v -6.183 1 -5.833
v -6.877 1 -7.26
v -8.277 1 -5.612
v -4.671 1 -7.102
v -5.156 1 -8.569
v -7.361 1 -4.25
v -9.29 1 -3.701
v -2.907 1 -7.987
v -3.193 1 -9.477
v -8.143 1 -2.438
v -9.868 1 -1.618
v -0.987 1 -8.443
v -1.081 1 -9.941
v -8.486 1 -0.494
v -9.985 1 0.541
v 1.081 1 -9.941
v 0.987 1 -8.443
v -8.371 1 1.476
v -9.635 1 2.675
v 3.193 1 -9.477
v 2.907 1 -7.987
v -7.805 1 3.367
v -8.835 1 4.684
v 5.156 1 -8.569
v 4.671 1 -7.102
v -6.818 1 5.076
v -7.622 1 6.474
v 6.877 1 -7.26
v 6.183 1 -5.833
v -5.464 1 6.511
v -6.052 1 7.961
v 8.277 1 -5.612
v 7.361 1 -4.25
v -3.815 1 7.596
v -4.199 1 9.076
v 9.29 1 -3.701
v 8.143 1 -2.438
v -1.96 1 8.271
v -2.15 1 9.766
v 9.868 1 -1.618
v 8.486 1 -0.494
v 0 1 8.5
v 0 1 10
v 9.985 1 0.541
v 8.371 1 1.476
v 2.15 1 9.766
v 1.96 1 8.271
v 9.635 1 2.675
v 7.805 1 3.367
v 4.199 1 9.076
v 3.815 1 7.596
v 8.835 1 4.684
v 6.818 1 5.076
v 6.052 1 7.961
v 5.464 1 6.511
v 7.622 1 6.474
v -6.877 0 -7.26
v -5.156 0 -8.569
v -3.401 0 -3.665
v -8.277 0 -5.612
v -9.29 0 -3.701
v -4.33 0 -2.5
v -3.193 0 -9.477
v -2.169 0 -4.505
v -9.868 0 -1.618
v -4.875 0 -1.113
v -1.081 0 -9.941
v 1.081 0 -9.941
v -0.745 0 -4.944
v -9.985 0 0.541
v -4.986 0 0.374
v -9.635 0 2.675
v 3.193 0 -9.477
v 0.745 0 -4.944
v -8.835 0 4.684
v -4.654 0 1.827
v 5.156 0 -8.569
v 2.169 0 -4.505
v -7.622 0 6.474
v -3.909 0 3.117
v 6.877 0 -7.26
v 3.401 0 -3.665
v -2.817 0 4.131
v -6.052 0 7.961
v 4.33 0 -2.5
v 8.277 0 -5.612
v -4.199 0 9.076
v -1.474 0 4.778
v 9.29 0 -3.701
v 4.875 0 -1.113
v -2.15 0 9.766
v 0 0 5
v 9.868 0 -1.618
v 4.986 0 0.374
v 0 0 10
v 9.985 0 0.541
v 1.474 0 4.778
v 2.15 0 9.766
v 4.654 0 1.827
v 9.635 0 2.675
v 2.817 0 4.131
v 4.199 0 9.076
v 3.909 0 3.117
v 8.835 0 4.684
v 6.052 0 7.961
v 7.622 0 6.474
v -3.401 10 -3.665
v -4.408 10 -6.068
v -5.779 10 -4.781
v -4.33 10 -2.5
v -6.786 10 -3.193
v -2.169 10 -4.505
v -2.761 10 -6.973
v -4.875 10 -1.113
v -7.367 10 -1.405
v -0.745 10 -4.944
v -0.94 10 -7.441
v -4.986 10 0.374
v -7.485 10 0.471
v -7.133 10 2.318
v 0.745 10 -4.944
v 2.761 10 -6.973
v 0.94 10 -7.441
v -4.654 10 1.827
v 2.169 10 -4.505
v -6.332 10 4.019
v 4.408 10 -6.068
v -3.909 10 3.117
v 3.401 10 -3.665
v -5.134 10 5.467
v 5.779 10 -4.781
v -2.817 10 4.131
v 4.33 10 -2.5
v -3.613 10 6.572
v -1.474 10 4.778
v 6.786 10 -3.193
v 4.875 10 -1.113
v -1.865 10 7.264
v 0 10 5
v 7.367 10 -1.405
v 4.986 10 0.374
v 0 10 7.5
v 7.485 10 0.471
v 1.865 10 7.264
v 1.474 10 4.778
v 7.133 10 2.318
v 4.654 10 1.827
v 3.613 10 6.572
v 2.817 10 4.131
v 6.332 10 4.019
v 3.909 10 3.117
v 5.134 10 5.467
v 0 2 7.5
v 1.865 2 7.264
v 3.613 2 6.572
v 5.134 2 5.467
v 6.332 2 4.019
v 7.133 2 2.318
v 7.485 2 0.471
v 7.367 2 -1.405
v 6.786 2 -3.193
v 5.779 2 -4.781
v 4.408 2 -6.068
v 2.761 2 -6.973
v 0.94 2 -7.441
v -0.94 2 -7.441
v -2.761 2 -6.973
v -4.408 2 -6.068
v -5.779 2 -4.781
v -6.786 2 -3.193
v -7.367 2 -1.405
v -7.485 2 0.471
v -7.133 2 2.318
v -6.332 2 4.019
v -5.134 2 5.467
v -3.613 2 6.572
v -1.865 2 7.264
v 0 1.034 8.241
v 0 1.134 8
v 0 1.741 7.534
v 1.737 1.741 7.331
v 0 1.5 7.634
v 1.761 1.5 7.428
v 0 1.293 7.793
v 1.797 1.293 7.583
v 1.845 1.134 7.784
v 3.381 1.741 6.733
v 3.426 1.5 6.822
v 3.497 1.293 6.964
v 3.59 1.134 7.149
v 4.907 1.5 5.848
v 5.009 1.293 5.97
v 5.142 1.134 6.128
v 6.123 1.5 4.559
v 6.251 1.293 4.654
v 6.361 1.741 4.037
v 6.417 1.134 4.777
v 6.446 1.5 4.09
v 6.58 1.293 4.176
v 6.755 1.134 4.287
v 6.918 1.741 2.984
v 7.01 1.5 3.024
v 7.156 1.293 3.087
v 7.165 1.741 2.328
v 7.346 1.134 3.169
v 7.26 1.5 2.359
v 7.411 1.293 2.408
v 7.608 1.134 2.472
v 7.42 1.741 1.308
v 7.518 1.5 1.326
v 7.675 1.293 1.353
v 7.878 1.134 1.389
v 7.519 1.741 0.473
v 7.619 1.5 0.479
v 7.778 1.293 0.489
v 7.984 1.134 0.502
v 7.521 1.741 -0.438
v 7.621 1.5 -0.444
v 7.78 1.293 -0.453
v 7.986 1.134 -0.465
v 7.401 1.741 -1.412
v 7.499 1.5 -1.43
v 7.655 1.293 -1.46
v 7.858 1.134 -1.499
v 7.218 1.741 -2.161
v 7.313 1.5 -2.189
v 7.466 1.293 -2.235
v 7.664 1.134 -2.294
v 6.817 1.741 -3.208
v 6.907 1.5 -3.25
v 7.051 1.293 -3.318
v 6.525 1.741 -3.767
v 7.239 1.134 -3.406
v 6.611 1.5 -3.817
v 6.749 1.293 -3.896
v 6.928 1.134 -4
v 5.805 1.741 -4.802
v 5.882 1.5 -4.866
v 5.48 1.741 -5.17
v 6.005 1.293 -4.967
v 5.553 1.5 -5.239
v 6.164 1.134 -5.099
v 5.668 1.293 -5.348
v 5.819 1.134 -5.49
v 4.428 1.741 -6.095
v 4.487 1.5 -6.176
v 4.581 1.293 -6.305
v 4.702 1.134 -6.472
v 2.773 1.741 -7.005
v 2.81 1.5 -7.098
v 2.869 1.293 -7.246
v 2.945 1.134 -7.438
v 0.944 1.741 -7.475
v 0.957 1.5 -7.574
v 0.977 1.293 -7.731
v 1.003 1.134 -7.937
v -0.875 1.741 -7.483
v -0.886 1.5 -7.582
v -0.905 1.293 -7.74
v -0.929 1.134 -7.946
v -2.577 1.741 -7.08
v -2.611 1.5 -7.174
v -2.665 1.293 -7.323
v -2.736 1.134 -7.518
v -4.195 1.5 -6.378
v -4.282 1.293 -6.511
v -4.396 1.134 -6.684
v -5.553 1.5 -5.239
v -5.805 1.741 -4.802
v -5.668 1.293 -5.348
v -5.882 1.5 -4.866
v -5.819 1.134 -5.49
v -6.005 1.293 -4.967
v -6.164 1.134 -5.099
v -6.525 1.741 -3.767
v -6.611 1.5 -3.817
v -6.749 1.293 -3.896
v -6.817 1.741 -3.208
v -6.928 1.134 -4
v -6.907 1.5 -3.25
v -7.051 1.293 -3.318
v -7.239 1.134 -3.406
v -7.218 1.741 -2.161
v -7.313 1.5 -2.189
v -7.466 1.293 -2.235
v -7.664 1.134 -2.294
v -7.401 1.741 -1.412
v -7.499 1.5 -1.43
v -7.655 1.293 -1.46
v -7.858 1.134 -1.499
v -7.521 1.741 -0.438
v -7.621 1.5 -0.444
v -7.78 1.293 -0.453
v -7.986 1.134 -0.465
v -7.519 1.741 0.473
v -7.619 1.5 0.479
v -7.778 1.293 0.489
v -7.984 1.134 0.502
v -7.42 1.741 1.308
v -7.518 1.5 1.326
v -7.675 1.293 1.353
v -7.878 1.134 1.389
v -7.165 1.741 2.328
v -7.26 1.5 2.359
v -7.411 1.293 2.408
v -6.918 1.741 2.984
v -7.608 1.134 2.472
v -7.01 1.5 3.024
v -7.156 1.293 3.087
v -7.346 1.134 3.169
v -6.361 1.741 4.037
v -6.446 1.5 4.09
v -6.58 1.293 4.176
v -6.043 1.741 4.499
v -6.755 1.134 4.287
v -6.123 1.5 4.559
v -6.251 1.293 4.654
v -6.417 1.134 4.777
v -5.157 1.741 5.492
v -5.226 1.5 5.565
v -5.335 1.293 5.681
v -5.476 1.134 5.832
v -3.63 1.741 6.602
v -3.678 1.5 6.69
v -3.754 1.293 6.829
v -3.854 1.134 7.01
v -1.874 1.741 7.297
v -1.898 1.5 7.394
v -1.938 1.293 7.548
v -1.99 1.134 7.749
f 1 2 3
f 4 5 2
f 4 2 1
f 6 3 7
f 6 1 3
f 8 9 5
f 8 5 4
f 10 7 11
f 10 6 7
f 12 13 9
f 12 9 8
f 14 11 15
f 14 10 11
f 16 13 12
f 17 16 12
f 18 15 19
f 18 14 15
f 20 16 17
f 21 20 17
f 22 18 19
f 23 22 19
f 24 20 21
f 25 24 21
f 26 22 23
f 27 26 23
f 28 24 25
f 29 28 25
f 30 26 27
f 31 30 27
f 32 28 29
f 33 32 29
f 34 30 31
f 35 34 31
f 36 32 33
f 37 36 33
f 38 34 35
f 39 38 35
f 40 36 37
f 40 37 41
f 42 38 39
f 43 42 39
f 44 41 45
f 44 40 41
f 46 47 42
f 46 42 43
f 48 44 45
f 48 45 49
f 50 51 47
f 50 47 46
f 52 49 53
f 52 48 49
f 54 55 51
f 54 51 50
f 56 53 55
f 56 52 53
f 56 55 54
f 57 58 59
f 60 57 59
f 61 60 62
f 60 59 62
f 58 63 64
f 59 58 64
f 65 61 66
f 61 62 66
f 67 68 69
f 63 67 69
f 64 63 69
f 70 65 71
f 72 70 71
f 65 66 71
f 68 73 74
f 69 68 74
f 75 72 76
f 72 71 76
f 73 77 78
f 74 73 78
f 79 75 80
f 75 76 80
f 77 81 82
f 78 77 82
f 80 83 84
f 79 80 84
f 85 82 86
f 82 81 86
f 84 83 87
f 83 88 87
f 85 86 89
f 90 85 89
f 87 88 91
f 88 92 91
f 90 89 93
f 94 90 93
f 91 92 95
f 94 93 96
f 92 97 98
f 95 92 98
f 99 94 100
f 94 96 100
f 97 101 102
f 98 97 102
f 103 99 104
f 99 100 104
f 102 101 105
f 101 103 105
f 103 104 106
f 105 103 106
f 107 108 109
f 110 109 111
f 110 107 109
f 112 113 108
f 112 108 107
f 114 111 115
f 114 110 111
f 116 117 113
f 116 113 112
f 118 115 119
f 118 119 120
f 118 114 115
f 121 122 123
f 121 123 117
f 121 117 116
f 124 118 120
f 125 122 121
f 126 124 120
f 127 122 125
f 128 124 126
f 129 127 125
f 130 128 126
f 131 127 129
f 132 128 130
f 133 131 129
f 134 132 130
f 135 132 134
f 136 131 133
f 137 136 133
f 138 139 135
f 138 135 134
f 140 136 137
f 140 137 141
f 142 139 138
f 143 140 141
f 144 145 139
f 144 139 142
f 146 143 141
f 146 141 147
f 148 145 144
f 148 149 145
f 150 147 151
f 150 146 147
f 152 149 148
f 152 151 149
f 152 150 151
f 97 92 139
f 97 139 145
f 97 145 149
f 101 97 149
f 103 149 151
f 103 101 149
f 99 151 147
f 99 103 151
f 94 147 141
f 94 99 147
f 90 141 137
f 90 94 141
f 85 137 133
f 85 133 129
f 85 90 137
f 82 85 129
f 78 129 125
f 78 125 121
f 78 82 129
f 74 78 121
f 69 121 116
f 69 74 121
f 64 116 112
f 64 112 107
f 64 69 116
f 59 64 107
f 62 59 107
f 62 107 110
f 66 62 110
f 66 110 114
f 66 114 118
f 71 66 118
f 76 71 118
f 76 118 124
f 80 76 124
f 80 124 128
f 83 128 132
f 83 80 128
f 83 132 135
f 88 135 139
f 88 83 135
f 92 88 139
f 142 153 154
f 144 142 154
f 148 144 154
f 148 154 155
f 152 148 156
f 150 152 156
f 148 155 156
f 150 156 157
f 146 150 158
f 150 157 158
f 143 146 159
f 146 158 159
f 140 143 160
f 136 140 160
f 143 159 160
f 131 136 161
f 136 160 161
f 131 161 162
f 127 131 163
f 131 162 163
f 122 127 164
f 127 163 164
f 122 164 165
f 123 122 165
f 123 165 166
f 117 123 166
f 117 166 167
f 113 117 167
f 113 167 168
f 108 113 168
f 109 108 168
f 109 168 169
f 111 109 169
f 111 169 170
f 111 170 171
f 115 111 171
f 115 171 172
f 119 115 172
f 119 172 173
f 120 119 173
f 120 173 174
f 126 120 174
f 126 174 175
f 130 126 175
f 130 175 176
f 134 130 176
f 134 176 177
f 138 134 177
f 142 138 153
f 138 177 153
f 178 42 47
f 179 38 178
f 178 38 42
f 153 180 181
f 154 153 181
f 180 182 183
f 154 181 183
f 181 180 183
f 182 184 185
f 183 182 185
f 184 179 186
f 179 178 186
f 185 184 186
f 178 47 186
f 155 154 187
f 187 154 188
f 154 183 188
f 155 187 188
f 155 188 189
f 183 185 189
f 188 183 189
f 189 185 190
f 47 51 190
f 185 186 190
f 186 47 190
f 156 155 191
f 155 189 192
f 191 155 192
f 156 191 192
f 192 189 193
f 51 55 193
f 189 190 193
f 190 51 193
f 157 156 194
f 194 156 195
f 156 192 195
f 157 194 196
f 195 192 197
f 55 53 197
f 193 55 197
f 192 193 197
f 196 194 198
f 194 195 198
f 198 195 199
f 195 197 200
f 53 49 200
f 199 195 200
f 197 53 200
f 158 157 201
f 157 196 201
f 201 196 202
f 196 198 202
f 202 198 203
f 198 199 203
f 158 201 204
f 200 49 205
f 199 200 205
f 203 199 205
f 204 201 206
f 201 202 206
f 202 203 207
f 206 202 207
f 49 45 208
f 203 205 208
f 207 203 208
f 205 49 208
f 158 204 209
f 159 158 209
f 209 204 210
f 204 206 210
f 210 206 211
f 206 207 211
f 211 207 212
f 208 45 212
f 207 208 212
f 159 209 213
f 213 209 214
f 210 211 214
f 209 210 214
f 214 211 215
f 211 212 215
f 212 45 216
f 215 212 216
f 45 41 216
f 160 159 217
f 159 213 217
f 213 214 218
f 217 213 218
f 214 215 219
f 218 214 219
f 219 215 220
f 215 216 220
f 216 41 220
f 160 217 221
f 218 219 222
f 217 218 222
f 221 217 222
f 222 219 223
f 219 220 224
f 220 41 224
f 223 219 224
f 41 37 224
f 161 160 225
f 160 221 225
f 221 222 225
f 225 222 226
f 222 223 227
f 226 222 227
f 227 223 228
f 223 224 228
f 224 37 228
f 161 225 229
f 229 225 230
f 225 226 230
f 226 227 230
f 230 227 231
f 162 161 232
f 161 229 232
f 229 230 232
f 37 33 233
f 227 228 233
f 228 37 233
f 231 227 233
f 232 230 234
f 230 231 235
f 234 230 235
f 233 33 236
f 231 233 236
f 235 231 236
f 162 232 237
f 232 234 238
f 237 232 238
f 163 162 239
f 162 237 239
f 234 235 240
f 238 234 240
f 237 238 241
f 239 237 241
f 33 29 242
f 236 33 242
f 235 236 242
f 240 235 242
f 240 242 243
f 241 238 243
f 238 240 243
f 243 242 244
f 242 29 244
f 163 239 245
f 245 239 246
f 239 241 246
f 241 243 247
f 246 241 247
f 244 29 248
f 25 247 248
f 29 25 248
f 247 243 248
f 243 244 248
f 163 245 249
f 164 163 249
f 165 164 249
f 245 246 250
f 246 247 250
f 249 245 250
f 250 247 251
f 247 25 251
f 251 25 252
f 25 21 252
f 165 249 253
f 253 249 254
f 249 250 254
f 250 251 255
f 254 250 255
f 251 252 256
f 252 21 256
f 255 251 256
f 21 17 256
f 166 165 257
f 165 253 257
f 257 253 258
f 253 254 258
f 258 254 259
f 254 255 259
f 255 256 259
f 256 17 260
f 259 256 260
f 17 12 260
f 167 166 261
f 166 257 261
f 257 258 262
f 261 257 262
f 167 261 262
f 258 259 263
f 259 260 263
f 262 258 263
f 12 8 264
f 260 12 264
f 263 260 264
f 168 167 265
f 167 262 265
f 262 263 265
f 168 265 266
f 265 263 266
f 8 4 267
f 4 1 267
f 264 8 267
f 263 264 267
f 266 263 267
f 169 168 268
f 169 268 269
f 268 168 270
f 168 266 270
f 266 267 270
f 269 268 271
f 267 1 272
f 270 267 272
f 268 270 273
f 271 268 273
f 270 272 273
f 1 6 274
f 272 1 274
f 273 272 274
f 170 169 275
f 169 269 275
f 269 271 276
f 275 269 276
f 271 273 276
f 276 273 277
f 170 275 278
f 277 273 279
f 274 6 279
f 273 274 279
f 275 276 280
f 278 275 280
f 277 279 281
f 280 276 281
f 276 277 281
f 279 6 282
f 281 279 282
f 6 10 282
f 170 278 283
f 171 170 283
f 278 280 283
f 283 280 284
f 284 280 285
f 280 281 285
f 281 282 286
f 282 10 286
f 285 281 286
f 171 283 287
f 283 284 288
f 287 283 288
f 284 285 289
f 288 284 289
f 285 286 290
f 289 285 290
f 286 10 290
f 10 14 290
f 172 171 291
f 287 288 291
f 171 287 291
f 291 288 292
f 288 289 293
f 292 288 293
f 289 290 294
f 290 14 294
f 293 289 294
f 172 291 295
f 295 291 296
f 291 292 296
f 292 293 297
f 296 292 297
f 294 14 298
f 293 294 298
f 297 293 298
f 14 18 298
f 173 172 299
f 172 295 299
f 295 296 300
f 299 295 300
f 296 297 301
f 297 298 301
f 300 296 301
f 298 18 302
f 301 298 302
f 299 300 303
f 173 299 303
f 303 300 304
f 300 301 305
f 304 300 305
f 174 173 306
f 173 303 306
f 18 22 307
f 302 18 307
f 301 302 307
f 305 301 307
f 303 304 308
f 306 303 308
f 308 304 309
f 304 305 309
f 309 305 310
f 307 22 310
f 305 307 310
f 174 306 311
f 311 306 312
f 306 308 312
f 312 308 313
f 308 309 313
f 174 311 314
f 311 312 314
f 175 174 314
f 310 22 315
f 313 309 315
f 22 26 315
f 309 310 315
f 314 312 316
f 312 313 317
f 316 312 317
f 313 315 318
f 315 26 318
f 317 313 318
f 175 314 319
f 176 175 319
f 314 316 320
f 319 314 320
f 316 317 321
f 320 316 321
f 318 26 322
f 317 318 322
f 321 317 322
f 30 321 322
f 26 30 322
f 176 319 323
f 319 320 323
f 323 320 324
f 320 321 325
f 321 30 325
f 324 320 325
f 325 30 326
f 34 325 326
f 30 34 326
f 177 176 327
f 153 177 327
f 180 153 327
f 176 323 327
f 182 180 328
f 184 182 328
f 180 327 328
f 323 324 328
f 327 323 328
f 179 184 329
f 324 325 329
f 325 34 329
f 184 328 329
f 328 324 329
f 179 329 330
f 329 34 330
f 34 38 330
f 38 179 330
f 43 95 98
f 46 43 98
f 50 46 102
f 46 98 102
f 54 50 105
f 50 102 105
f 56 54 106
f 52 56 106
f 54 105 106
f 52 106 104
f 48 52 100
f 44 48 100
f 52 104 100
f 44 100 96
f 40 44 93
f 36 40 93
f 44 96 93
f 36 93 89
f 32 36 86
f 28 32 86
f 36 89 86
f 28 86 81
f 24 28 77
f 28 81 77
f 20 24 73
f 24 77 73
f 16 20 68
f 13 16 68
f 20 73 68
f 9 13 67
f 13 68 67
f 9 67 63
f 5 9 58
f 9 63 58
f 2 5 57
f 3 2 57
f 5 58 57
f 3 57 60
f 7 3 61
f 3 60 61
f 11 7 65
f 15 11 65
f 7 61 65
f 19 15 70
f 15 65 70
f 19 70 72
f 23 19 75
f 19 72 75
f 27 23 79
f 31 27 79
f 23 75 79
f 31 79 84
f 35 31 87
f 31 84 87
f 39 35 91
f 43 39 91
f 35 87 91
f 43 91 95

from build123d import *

# Parameters (mm, degrees)
SKETCH1_R           = 10
SKETCH1_R_2         = 7.5
BOSS_EXTRUDE1_DEPTH = 1
SKETCH1_3_R         = 7.5
SKETCH1_3_R_2       = 5
BOSS_EXTRUDE2_DEPTH = 10
FILLET1_R           = 1


with BuildPart() as part:
    # Sketch1 → Boss-Extrude1 (new body)
    with BuildSketch(Plane(origin=(0, 0, 0), x_dir=(-1, 0, 0), z_dir=(0, 1, 0))):
        Circle(SKETCH1_R)
        Circle(SKETCH1_R_2, mode=Mode.SUBTRACT)
    extrude(amount=BOSS_EXTRUDE1_DEPTH)

    # Sketch1<3> → Boss-Extrude2 (add)
    with BuildSketch(Plane(origin=(0, 0, 0), x_dir=(-1, 0, 0), z_dir=(0, 1, 0))):
        Circle(SKETCH1_3_R)
        Circle(SKETCH1_3_R_2, mode=Mode.SUBTRACT)
    extrude(amount=BOSS_EXTRUDE2_DEPTH)

    # Fillet1
    fillet1_edges = [part.edges().sort_by_distance(p)[0] for p in [
        (7.5, 1, 0),
    ]]
    fillet(fillet1_edges, radius=FILLET1_R)


solid = part.part
